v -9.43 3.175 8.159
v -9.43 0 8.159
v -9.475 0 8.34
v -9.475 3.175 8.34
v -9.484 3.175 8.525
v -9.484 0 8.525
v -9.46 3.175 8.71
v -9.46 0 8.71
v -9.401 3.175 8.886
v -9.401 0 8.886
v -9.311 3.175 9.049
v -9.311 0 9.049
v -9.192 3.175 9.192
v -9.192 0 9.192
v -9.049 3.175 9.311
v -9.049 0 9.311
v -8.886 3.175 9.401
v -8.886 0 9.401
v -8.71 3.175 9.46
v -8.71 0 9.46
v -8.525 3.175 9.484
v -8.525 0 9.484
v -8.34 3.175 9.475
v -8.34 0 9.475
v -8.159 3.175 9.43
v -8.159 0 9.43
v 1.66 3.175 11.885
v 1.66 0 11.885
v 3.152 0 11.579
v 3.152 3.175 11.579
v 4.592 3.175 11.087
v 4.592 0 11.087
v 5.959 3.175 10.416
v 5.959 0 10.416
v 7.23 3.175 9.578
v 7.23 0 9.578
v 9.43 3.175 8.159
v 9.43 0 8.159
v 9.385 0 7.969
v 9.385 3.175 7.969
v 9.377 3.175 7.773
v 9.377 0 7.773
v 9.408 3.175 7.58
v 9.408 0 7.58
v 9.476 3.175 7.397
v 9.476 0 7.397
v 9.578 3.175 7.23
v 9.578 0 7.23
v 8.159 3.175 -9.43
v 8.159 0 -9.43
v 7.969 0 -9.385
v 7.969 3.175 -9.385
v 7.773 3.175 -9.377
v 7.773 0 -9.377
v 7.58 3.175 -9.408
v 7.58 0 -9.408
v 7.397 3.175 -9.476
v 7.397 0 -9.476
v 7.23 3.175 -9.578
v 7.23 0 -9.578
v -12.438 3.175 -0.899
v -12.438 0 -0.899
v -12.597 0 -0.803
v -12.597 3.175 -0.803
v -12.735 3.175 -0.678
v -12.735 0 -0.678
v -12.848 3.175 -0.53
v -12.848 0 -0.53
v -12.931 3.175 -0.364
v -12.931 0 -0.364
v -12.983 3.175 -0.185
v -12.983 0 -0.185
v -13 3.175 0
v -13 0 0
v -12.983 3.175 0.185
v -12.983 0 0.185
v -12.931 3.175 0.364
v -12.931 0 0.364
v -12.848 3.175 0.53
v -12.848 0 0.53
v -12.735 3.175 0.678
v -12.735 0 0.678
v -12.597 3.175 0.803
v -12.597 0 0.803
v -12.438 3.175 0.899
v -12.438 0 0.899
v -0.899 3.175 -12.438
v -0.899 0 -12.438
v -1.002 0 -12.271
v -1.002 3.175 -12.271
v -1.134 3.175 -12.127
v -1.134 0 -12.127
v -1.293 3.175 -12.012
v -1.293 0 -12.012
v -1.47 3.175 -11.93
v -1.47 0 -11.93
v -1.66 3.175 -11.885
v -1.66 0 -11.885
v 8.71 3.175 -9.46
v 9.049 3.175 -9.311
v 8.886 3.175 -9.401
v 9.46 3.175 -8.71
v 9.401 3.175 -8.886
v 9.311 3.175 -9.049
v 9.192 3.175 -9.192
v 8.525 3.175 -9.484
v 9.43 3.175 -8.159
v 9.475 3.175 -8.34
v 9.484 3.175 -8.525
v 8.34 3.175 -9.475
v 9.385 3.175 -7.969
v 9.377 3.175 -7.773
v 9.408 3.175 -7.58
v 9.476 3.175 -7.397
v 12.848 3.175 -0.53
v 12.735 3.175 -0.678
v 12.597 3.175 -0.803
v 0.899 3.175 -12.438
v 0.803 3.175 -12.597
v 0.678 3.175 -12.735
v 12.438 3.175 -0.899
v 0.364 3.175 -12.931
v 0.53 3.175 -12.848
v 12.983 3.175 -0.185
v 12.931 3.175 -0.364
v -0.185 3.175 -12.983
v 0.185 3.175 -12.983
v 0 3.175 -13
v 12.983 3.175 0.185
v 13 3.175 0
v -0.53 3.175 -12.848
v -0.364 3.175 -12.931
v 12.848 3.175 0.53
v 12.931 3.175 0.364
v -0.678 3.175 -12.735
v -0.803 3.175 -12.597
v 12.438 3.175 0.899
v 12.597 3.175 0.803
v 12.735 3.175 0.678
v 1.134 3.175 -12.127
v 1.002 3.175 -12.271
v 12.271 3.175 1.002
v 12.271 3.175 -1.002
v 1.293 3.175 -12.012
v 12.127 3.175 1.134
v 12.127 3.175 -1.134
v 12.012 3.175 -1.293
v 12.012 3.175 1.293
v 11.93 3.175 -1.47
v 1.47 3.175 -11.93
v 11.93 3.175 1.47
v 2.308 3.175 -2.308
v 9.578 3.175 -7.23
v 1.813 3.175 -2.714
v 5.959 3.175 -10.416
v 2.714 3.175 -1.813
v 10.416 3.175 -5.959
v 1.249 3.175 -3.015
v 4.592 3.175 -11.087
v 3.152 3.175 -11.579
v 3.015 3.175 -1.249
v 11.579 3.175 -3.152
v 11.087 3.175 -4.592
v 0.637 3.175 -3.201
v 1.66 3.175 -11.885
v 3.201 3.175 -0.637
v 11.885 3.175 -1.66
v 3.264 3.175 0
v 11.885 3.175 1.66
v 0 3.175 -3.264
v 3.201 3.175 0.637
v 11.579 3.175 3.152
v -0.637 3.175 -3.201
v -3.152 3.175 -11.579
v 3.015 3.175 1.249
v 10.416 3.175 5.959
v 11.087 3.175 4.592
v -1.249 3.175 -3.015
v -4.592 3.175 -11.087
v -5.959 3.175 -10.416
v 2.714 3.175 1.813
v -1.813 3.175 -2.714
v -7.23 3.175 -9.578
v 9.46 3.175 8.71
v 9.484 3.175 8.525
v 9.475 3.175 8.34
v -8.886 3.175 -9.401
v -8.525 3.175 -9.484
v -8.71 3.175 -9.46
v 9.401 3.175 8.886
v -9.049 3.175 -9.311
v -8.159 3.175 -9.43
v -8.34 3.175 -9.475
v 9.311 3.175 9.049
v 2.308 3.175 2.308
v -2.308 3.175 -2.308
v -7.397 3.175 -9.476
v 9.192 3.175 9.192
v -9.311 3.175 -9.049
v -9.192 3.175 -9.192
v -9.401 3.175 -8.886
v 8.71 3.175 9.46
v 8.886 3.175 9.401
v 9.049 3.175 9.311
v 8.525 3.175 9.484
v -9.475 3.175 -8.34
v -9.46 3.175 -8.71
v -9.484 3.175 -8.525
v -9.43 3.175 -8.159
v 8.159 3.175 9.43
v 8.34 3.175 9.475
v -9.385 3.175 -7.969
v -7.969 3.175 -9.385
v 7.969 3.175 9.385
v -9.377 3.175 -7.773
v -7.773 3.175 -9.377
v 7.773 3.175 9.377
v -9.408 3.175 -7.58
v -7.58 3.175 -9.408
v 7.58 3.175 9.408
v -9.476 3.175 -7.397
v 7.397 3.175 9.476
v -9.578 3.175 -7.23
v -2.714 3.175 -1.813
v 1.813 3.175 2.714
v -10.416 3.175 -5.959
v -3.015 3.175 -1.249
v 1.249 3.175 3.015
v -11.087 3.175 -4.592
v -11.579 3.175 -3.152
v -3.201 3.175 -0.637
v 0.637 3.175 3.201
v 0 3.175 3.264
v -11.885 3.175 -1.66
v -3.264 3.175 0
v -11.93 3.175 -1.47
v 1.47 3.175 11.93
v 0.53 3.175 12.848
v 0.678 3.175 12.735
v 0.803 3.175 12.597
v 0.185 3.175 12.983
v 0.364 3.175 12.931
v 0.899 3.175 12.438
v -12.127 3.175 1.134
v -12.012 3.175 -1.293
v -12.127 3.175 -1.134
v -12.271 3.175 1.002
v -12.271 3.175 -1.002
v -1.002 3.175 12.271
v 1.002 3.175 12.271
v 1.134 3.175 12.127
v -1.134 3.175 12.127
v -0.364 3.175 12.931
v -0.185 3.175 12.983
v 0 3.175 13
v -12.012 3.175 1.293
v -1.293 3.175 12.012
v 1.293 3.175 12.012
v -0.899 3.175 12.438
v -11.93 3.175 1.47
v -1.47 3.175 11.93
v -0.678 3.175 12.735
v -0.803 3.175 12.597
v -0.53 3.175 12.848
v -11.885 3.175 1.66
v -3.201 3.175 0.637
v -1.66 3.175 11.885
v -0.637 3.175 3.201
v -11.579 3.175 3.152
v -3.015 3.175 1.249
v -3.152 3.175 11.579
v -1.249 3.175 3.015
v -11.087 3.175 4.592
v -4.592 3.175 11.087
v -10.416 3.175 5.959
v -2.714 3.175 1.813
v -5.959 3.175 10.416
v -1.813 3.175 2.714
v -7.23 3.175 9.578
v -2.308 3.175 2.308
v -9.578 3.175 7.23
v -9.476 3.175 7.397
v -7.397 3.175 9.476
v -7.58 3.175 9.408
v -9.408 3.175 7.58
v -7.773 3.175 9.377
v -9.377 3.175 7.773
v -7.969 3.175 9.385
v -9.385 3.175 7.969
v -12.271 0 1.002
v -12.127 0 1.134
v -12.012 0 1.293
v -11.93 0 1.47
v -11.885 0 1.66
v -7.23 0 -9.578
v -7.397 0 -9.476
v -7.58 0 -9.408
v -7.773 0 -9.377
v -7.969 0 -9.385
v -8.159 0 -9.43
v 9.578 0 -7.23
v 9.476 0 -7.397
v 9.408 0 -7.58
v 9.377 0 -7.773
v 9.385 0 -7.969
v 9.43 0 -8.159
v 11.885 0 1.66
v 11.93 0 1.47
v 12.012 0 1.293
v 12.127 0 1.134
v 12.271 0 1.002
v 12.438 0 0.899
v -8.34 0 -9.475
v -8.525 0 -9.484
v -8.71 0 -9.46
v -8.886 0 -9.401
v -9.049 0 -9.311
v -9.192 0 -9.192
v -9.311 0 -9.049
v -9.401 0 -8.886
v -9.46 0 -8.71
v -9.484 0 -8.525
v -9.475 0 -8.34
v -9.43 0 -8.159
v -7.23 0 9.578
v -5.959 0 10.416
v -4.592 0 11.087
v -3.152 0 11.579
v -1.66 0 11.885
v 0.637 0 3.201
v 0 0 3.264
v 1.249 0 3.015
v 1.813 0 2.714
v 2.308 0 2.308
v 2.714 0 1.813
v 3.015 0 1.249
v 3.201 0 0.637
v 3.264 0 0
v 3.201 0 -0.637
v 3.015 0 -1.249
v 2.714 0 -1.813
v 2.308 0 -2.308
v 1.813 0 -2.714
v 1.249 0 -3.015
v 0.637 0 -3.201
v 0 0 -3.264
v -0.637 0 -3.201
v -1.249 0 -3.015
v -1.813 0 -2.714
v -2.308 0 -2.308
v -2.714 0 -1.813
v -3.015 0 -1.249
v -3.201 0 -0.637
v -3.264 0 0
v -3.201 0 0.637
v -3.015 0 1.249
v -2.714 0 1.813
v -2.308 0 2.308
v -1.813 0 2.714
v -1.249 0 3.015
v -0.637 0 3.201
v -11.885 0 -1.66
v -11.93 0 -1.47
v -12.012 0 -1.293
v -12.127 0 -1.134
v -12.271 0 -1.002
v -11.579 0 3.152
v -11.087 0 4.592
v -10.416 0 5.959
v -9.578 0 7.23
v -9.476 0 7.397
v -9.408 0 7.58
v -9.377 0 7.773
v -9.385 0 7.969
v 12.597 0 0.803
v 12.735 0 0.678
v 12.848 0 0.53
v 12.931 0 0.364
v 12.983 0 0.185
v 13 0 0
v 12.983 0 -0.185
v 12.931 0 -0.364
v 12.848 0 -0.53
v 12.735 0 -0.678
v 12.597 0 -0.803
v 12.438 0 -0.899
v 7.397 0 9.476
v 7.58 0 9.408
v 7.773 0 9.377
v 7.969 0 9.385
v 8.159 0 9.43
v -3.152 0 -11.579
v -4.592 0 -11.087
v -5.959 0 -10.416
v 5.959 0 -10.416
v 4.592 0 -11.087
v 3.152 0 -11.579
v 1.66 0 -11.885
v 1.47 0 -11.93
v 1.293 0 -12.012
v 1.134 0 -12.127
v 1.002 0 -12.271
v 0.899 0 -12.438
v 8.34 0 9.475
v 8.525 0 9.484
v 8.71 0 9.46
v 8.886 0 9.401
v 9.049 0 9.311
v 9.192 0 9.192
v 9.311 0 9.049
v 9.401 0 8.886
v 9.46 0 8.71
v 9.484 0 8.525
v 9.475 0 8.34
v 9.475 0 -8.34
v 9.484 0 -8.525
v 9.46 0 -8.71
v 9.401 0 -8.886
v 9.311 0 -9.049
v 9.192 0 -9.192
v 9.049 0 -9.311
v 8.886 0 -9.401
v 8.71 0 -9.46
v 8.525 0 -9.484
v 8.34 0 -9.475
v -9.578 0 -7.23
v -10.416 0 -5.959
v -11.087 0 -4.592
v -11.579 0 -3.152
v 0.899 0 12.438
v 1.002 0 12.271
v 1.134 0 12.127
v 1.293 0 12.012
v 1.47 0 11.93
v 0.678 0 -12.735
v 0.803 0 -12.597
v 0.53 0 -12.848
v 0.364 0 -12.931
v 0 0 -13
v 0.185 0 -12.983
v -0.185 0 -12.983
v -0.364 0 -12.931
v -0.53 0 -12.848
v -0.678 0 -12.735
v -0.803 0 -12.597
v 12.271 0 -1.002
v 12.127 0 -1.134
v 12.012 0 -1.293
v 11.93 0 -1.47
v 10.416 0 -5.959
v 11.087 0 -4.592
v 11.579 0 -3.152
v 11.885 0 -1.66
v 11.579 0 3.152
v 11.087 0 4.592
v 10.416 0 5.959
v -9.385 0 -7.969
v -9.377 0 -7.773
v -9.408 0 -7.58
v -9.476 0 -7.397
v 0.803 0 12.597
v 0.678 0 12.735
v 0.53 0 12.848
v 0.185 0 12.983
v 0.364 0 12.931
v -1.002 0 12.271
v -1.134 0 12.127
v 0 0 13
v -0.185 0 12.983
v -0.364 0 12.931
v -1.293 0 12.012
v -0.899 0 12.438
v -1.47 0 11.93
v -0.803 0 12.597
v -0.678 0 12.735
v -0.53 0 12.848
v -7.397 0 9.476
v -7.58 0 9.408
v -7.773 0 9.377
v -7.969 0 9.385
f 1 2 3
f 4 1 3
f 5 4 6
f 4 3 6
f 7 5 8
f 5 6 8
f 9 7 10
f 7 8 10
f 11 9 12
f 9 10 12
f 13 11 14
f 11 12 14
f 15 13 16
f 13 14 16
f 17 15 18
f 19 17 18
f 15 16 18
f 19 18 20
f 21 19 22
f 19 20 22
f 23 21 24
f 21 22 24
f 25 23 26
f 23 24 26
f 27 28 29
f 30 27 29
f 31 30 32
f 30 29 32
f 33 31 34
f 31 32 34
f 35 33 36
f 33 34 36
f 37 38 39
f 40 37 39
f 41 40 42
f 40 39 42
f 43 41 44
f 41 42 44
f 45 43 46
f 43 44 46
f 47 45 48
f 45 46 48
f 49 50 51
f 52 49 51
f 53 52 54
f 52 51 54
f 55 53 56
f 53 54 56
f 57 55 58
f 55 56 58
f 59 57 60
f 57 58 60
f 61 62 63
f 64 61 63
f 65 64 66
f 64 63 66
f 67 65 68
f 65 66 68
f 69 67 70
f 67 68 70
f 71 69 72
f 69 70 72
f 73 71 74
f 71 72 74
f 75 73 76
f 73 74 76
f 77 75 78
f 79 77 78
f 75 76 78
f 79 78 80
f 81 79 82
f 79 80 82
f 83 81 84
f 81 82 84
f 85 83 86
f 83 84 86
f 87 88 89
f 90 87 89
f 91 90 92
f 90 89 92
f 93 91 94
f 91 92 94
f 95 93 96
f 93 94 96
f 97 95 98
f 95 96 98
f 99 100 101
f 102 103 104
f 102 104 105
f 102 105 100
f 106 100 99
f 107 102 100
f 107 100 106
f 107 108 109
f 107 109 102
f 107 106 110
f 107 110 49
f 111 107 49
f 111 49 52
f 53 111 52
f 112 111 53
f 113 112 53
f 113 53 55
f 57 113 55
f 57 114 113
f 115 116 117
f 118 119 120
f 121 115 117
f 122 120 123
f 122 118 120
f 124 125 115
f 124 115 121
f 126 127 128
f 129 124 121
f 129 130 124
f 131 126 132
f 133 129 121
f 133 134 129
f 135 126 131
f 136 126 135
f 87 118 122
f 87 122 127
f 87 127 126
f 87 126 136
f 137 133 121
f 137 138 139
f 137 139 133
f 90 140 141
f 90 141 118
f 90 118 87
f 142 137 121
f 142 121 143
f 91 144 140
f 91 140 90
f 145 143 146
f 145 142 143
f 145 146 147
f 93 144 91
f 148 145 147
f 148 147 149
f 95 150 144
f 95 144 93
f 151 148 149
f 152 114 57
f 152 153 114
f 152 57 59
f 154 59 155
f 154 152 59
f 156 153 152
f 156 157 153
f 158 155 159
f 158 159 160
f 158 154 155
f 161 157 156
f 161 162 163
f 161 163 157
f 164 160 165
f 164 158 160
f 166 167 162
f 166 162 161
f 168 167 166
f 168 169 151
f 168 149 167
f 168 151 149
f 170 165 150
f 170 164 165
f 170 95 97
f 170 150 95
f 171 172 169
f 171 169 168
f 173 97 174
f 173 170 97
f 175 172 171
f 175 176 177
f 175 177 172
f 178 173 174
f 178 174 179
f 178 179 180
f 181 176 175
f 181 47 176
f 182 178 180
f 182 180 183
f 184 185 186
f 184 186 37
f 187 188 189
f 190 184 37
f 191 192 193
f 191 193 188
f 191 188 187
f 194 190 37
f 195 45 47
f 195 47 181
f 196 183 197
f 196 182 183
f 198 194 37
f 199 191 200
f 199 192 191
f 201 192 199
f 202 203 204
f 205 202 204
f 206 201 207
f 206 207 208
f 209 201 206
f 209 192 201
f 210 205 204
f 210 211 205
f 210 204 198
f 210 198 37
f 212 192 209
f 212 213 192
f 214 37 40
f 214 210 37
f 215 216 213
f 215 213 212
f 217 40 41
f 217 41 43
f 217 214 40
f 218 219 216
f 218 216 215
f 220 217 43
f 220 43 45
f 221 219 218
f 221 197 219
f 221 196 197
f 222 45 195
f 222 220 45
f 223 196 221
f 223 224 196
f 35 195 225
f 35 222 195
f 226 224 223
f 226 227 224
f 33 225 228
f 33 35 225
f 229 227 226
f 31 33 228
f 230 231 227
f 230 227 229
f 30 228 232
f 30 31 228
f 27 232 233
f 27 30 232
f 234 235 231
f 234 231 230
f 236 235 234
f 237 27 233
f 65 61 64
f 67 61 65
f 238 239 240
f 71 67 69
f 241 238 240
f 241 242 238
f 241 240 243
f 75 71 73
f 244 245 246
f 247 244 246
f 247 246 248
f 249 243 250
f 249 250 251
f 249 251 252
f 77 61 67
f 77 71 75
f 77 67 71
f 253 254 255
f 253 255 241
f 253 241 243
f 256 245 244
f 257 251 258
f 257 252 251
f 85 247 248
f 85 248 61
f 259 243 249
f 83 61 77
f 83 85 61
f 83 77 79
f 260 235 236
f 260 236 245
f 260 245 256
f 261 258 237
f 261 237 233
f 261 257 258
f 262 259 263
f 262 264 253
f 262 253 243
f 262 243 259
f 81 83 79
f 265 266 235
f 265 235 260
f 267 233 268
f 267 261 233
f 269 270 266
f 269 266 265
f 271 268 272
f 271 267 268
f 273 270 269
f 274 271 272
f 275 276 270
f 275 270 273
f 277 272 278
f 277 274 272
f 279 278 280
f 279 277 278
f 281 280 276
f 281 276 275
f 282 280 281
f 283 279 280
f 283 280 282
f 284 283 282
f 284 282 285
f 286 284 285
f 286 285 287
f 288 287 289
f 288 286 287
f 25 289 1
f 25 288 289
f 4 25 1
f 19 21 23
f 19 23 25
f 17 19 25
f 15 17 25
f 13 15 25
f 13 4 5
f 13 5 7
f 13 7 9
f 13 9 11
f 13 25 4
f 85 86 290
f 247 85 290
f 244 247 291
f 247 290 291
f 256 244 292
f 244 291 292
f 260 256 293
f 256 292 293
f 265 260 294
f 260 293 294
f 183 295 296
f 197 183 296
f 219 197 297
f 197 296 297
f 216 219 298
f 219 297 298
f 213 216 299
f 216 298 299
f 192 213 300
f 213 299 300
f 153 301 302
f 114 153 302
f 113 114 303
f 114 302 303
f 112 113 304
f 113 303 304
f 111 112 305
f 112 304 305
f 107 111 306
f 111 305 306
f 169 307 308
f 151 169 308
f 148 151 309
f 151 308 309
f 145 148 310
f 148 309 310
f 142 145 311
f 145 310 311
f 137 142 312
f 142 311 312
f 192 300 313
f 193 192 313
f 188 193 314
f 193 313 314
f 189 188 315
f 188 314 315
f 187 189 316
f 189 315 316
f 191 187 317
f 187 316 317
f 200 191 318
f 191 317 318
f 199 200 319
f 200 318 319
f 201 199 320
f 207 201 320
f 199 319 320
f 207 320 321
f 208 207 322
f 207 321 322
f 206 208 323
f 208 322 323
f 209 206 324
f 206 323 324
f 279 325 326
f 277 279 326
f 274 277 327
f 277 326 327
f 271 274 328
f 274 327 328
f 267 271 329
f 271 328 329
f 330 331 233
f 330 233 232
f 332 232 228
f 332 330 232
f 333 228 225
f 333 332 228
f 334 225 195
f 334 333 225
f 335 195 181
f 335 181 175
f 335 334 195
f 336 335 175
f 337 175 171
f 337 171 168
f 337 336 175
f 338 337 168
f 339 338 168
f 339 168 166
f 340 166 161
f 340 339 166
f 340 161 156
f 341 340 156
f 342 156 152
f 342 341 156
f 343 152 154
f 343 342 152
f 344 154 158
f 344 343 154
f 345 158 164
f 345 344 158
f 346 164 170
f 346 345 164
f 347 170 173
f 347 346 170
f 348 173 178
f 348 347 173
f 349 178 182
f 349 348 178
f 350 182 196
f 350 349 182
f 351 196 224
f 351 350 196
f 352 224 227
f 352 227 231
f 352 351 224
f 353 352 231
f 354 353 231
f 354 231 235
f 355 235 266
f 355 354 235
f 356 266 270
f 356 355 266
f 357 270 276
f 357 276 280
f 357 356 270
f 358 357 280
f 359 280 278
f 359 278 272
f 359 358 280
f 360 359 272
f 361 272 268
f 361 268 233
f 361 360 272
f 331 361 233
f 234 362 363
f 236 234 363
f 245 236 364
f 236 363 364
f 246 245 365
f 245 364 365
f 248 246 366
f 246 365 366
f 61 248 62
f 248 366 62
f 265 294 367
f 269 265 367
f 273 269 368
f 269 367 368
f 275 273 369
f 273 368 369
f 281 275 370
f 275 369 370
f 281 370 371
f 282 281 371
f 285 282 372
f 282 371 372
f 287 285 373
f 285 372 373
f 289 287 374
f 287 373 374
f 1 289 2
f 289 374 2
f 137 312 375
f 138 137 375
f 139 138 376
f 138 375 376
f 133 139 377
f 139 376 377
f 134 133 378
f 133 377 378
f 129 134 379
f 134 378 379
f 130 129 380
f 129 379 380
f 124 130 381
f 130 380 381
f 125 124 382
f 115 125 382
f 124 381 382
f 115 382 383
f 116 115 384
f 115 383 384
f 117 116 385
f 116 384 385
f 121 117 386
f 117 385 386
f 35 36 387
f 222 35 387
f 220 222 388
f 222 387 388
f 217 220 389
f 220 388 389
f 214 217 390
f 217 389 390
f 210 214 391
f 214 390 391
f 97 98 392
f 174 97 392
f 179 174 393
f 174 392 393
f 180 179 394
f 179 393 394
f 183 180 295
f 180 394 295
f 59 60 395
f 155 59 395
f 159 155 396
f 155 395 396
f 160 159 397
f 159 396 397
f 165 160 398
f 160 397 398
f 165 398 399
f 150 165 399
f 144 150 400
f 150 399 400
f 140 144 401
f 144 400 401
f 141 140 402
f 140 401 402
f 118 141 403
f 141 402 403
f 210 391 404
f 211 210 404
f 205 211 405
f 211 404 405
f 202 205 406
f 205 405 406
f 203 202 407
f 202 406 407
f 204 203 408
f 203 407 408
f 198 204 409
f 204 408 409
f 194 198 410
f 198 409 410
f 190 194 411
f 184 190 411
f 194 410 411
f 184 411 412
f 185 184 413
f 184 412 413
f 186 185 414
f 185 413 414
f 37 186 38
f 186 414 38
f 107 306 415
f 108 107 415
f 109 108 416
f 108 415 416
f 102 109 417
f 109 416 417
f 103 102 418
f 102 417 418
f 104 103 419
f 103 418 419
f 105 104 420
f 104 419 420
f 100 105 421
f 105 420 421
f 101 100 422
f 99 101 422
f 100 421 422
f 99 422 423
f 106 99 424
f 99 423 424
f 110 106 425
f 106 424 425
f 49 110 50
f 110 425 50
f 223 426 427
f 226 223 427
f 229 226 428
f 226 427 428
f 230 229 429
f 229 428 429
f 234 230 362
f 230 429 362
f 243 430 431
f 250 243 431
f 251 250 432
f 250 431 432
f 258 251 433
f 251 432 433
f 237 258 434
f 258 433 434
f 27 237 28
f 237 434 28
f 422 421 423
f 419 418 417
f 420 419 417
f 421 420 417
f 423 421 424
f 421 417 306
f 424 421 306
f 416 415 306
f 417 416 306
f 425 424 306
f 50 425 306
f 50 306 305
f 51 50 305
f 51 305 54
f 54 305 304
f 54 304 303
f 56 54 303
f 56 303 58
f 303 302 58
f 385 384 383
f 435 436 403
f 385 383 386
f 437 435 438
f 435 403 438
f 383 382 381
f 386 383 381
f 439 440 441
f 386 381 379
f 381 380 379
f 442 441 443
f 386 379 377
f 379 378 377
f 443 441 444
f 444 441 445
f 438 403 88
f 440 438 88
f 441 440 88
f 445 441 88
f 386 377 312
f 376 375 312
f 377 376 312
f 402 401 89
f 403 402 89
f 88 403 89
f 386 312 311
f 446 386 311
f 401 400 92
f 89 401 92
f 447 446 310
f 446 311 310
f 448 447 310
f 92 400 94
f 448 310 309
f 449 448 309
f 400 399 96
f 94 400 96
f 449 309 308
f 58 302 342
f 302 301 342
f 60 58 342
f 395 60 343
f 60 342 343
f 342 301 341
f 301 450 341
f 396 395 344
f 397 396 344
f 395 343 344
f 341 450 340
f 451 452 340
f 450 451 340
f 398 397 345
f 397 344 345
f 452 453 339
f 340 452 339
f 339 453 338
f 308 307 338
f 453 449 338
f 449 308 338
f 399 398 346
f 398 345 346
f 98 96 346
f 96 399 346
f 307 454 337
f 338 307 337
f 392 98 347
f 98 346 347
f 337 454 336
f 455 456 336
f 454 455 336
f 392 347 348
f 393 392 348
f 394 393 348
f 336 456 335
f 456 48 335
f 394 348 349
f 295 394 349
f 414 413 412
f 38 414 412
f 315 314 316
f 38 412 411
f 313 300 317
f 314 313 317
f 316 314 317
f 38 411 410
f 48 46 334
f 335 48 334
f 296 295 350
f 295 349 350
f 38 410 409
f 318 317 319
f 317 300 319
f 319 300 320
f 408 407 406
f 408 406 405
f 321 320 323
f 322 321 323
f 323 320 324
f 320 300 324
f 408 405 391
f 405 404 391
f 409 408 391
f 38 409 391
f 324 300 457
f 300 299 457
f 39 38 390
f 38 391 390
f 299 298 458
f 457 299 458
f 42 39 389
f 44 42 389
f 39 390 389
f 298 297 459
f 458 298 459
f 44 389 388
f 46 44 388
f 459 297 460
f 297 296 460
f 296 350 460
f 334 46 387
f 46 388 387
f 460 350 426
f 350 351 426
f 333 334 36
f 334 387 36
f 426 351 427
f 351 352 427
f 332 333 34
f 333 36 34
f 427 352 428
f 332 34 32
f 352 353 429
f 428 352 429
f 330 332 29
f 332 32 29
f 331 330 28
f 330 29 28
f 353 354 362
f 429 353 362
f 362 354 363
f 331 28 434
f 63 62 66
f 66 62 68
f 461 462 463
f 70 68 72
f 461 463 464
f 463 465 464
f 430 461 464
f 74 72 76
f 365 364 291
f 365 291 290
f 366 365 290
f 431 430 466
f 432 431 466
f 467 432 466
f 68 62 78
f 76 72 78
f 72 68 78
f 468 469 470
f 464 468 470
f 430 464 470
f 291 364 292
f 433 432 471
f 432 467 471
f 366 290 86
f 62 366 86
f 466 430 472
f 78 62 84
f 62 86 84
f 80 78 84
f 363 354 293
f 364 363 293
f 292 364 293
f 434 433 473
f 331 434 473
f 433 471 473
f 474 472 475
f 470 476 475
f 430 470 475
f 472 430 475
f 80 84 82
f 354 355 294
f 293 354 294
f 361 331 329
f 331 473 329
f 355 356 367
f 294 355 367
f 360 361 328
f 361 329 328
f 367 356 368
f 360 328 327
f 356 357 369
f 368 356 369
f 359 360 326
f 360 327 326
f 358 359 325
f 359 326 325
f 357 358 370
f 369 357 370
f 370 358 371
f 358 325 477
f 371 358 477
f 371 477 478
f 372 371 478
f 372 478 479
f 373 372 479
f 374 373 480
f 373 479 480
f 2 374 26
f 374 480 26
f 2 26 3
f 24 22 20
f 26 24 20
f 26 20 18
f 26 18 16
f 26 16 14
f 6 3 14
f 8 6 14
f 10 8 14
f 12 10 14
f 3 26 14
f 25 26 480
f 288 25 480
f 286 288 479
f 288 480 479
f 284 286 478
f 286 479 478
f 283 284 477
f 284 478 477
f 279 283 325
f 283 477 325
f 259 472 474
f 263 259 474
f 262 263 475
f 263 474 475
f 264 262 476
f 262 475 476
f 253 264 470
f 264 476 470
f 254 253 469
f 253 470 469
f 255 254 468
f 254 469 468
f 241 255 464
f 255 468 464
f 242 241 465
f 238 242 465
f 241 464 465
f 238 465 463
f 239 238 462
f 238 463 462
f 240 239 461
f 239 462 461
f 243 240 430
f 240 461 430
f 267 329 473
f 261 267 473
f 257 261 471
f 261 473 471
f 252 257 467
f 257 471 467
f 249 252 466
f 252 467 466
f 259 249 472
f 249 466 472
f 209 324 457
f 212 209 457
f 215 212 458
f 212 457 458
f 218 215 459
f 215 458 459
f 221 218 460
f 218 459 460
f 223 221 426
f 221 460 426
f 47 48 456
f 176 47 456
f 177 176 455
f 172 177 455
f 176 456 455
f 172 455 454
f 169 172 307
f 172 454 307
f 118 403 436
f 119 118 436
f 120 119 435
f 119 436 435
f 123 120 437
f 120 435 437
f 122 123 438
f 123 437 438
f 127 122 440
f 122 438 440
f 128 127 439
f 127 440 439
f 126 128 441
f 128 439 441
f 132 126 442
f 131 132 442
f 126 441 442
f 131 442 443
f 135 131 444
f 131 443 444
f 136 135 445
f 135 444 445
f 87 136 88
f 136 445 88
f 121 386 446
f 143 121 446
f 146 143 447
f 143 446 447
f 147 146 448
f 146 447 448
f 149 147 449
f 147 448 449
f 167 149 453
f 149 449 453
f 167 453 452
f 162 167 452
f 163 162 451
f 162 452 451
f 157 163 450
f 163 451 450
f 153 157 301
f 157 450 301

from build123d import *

# Parameters (mm, degrees)
SKETCH2_R           = 3.2639
BOSS_EXTRUDE1_DEPTH = 3.175
BOSS_EXTRUDE2_DEPTH = 3.175
CIRPATTERN1_COUNT   = 8


with BuildPart() as part:
    # Sketch2 → Boss-Extrude1 (new body)
    with BuildSketch(Plane(origin=(0, 0, 0), x_dir=(-1, 0, 0), z_dir=(0, 1, 0))):
        with BuildLine():
            ThreePointArc((-1.660095527, 11.884615385), (-7.876511083, -9.053207894), (12, 0))
            ThreePointArc((12, 0), (9.053207894, 7.876511083), (1.660095527, 11.884615385))
            ThreePointArc((1.660095527, 11.884615385), (0, 12), (-1.660095527, 11.884615385))
        make_face()
        Circle(SKETCH2_R, mode=Mode.SUBTRACT)
    extrude(amount=BOSS_EXTRUDE1_DEPTH)

    # Sketch2<3> → Boss-Extrude2 (add)
    with BuildSketch(Plane(origin=(0, 0, 0), x_dir=(-1, 0, 0), z_dir=(0, 1, 0))):
        with BuildLine():
            ThreePointArc((-1.660095527, 11.884615385), (0, 12), (1.660095527, 11.884615385))
            ThreePointArc((1.660095527, 11.884615385), (1.210599357, 12.066020943), (0.899218411, 12.4375))
            ThreePointArc((0.899218411, 12.4375), (0, 13), (-0.899218411, 12.4375))
            ThreePointArc((-0.899218411, 12.4375), (-1.210599357, 12.066020943), (-1.660095527, 11.884615385))
        make_face()
    boss_extrude2 = extrude(amount=BOSS_EXTRUDE2_DEPTH)

    # CirPattern1: Boss-Extrude2 ×8 about axis
    cirpattern1_axis = Axis((0, 3.175, 0), (0, -1, 0))
    for i in range(1, CIRPATTERN1_COUNT):
        add(boss_extrude2.rotate(cirpattern1_axis, i * 360 / CIRPATTERN1_COUNT))


solid = part.part
